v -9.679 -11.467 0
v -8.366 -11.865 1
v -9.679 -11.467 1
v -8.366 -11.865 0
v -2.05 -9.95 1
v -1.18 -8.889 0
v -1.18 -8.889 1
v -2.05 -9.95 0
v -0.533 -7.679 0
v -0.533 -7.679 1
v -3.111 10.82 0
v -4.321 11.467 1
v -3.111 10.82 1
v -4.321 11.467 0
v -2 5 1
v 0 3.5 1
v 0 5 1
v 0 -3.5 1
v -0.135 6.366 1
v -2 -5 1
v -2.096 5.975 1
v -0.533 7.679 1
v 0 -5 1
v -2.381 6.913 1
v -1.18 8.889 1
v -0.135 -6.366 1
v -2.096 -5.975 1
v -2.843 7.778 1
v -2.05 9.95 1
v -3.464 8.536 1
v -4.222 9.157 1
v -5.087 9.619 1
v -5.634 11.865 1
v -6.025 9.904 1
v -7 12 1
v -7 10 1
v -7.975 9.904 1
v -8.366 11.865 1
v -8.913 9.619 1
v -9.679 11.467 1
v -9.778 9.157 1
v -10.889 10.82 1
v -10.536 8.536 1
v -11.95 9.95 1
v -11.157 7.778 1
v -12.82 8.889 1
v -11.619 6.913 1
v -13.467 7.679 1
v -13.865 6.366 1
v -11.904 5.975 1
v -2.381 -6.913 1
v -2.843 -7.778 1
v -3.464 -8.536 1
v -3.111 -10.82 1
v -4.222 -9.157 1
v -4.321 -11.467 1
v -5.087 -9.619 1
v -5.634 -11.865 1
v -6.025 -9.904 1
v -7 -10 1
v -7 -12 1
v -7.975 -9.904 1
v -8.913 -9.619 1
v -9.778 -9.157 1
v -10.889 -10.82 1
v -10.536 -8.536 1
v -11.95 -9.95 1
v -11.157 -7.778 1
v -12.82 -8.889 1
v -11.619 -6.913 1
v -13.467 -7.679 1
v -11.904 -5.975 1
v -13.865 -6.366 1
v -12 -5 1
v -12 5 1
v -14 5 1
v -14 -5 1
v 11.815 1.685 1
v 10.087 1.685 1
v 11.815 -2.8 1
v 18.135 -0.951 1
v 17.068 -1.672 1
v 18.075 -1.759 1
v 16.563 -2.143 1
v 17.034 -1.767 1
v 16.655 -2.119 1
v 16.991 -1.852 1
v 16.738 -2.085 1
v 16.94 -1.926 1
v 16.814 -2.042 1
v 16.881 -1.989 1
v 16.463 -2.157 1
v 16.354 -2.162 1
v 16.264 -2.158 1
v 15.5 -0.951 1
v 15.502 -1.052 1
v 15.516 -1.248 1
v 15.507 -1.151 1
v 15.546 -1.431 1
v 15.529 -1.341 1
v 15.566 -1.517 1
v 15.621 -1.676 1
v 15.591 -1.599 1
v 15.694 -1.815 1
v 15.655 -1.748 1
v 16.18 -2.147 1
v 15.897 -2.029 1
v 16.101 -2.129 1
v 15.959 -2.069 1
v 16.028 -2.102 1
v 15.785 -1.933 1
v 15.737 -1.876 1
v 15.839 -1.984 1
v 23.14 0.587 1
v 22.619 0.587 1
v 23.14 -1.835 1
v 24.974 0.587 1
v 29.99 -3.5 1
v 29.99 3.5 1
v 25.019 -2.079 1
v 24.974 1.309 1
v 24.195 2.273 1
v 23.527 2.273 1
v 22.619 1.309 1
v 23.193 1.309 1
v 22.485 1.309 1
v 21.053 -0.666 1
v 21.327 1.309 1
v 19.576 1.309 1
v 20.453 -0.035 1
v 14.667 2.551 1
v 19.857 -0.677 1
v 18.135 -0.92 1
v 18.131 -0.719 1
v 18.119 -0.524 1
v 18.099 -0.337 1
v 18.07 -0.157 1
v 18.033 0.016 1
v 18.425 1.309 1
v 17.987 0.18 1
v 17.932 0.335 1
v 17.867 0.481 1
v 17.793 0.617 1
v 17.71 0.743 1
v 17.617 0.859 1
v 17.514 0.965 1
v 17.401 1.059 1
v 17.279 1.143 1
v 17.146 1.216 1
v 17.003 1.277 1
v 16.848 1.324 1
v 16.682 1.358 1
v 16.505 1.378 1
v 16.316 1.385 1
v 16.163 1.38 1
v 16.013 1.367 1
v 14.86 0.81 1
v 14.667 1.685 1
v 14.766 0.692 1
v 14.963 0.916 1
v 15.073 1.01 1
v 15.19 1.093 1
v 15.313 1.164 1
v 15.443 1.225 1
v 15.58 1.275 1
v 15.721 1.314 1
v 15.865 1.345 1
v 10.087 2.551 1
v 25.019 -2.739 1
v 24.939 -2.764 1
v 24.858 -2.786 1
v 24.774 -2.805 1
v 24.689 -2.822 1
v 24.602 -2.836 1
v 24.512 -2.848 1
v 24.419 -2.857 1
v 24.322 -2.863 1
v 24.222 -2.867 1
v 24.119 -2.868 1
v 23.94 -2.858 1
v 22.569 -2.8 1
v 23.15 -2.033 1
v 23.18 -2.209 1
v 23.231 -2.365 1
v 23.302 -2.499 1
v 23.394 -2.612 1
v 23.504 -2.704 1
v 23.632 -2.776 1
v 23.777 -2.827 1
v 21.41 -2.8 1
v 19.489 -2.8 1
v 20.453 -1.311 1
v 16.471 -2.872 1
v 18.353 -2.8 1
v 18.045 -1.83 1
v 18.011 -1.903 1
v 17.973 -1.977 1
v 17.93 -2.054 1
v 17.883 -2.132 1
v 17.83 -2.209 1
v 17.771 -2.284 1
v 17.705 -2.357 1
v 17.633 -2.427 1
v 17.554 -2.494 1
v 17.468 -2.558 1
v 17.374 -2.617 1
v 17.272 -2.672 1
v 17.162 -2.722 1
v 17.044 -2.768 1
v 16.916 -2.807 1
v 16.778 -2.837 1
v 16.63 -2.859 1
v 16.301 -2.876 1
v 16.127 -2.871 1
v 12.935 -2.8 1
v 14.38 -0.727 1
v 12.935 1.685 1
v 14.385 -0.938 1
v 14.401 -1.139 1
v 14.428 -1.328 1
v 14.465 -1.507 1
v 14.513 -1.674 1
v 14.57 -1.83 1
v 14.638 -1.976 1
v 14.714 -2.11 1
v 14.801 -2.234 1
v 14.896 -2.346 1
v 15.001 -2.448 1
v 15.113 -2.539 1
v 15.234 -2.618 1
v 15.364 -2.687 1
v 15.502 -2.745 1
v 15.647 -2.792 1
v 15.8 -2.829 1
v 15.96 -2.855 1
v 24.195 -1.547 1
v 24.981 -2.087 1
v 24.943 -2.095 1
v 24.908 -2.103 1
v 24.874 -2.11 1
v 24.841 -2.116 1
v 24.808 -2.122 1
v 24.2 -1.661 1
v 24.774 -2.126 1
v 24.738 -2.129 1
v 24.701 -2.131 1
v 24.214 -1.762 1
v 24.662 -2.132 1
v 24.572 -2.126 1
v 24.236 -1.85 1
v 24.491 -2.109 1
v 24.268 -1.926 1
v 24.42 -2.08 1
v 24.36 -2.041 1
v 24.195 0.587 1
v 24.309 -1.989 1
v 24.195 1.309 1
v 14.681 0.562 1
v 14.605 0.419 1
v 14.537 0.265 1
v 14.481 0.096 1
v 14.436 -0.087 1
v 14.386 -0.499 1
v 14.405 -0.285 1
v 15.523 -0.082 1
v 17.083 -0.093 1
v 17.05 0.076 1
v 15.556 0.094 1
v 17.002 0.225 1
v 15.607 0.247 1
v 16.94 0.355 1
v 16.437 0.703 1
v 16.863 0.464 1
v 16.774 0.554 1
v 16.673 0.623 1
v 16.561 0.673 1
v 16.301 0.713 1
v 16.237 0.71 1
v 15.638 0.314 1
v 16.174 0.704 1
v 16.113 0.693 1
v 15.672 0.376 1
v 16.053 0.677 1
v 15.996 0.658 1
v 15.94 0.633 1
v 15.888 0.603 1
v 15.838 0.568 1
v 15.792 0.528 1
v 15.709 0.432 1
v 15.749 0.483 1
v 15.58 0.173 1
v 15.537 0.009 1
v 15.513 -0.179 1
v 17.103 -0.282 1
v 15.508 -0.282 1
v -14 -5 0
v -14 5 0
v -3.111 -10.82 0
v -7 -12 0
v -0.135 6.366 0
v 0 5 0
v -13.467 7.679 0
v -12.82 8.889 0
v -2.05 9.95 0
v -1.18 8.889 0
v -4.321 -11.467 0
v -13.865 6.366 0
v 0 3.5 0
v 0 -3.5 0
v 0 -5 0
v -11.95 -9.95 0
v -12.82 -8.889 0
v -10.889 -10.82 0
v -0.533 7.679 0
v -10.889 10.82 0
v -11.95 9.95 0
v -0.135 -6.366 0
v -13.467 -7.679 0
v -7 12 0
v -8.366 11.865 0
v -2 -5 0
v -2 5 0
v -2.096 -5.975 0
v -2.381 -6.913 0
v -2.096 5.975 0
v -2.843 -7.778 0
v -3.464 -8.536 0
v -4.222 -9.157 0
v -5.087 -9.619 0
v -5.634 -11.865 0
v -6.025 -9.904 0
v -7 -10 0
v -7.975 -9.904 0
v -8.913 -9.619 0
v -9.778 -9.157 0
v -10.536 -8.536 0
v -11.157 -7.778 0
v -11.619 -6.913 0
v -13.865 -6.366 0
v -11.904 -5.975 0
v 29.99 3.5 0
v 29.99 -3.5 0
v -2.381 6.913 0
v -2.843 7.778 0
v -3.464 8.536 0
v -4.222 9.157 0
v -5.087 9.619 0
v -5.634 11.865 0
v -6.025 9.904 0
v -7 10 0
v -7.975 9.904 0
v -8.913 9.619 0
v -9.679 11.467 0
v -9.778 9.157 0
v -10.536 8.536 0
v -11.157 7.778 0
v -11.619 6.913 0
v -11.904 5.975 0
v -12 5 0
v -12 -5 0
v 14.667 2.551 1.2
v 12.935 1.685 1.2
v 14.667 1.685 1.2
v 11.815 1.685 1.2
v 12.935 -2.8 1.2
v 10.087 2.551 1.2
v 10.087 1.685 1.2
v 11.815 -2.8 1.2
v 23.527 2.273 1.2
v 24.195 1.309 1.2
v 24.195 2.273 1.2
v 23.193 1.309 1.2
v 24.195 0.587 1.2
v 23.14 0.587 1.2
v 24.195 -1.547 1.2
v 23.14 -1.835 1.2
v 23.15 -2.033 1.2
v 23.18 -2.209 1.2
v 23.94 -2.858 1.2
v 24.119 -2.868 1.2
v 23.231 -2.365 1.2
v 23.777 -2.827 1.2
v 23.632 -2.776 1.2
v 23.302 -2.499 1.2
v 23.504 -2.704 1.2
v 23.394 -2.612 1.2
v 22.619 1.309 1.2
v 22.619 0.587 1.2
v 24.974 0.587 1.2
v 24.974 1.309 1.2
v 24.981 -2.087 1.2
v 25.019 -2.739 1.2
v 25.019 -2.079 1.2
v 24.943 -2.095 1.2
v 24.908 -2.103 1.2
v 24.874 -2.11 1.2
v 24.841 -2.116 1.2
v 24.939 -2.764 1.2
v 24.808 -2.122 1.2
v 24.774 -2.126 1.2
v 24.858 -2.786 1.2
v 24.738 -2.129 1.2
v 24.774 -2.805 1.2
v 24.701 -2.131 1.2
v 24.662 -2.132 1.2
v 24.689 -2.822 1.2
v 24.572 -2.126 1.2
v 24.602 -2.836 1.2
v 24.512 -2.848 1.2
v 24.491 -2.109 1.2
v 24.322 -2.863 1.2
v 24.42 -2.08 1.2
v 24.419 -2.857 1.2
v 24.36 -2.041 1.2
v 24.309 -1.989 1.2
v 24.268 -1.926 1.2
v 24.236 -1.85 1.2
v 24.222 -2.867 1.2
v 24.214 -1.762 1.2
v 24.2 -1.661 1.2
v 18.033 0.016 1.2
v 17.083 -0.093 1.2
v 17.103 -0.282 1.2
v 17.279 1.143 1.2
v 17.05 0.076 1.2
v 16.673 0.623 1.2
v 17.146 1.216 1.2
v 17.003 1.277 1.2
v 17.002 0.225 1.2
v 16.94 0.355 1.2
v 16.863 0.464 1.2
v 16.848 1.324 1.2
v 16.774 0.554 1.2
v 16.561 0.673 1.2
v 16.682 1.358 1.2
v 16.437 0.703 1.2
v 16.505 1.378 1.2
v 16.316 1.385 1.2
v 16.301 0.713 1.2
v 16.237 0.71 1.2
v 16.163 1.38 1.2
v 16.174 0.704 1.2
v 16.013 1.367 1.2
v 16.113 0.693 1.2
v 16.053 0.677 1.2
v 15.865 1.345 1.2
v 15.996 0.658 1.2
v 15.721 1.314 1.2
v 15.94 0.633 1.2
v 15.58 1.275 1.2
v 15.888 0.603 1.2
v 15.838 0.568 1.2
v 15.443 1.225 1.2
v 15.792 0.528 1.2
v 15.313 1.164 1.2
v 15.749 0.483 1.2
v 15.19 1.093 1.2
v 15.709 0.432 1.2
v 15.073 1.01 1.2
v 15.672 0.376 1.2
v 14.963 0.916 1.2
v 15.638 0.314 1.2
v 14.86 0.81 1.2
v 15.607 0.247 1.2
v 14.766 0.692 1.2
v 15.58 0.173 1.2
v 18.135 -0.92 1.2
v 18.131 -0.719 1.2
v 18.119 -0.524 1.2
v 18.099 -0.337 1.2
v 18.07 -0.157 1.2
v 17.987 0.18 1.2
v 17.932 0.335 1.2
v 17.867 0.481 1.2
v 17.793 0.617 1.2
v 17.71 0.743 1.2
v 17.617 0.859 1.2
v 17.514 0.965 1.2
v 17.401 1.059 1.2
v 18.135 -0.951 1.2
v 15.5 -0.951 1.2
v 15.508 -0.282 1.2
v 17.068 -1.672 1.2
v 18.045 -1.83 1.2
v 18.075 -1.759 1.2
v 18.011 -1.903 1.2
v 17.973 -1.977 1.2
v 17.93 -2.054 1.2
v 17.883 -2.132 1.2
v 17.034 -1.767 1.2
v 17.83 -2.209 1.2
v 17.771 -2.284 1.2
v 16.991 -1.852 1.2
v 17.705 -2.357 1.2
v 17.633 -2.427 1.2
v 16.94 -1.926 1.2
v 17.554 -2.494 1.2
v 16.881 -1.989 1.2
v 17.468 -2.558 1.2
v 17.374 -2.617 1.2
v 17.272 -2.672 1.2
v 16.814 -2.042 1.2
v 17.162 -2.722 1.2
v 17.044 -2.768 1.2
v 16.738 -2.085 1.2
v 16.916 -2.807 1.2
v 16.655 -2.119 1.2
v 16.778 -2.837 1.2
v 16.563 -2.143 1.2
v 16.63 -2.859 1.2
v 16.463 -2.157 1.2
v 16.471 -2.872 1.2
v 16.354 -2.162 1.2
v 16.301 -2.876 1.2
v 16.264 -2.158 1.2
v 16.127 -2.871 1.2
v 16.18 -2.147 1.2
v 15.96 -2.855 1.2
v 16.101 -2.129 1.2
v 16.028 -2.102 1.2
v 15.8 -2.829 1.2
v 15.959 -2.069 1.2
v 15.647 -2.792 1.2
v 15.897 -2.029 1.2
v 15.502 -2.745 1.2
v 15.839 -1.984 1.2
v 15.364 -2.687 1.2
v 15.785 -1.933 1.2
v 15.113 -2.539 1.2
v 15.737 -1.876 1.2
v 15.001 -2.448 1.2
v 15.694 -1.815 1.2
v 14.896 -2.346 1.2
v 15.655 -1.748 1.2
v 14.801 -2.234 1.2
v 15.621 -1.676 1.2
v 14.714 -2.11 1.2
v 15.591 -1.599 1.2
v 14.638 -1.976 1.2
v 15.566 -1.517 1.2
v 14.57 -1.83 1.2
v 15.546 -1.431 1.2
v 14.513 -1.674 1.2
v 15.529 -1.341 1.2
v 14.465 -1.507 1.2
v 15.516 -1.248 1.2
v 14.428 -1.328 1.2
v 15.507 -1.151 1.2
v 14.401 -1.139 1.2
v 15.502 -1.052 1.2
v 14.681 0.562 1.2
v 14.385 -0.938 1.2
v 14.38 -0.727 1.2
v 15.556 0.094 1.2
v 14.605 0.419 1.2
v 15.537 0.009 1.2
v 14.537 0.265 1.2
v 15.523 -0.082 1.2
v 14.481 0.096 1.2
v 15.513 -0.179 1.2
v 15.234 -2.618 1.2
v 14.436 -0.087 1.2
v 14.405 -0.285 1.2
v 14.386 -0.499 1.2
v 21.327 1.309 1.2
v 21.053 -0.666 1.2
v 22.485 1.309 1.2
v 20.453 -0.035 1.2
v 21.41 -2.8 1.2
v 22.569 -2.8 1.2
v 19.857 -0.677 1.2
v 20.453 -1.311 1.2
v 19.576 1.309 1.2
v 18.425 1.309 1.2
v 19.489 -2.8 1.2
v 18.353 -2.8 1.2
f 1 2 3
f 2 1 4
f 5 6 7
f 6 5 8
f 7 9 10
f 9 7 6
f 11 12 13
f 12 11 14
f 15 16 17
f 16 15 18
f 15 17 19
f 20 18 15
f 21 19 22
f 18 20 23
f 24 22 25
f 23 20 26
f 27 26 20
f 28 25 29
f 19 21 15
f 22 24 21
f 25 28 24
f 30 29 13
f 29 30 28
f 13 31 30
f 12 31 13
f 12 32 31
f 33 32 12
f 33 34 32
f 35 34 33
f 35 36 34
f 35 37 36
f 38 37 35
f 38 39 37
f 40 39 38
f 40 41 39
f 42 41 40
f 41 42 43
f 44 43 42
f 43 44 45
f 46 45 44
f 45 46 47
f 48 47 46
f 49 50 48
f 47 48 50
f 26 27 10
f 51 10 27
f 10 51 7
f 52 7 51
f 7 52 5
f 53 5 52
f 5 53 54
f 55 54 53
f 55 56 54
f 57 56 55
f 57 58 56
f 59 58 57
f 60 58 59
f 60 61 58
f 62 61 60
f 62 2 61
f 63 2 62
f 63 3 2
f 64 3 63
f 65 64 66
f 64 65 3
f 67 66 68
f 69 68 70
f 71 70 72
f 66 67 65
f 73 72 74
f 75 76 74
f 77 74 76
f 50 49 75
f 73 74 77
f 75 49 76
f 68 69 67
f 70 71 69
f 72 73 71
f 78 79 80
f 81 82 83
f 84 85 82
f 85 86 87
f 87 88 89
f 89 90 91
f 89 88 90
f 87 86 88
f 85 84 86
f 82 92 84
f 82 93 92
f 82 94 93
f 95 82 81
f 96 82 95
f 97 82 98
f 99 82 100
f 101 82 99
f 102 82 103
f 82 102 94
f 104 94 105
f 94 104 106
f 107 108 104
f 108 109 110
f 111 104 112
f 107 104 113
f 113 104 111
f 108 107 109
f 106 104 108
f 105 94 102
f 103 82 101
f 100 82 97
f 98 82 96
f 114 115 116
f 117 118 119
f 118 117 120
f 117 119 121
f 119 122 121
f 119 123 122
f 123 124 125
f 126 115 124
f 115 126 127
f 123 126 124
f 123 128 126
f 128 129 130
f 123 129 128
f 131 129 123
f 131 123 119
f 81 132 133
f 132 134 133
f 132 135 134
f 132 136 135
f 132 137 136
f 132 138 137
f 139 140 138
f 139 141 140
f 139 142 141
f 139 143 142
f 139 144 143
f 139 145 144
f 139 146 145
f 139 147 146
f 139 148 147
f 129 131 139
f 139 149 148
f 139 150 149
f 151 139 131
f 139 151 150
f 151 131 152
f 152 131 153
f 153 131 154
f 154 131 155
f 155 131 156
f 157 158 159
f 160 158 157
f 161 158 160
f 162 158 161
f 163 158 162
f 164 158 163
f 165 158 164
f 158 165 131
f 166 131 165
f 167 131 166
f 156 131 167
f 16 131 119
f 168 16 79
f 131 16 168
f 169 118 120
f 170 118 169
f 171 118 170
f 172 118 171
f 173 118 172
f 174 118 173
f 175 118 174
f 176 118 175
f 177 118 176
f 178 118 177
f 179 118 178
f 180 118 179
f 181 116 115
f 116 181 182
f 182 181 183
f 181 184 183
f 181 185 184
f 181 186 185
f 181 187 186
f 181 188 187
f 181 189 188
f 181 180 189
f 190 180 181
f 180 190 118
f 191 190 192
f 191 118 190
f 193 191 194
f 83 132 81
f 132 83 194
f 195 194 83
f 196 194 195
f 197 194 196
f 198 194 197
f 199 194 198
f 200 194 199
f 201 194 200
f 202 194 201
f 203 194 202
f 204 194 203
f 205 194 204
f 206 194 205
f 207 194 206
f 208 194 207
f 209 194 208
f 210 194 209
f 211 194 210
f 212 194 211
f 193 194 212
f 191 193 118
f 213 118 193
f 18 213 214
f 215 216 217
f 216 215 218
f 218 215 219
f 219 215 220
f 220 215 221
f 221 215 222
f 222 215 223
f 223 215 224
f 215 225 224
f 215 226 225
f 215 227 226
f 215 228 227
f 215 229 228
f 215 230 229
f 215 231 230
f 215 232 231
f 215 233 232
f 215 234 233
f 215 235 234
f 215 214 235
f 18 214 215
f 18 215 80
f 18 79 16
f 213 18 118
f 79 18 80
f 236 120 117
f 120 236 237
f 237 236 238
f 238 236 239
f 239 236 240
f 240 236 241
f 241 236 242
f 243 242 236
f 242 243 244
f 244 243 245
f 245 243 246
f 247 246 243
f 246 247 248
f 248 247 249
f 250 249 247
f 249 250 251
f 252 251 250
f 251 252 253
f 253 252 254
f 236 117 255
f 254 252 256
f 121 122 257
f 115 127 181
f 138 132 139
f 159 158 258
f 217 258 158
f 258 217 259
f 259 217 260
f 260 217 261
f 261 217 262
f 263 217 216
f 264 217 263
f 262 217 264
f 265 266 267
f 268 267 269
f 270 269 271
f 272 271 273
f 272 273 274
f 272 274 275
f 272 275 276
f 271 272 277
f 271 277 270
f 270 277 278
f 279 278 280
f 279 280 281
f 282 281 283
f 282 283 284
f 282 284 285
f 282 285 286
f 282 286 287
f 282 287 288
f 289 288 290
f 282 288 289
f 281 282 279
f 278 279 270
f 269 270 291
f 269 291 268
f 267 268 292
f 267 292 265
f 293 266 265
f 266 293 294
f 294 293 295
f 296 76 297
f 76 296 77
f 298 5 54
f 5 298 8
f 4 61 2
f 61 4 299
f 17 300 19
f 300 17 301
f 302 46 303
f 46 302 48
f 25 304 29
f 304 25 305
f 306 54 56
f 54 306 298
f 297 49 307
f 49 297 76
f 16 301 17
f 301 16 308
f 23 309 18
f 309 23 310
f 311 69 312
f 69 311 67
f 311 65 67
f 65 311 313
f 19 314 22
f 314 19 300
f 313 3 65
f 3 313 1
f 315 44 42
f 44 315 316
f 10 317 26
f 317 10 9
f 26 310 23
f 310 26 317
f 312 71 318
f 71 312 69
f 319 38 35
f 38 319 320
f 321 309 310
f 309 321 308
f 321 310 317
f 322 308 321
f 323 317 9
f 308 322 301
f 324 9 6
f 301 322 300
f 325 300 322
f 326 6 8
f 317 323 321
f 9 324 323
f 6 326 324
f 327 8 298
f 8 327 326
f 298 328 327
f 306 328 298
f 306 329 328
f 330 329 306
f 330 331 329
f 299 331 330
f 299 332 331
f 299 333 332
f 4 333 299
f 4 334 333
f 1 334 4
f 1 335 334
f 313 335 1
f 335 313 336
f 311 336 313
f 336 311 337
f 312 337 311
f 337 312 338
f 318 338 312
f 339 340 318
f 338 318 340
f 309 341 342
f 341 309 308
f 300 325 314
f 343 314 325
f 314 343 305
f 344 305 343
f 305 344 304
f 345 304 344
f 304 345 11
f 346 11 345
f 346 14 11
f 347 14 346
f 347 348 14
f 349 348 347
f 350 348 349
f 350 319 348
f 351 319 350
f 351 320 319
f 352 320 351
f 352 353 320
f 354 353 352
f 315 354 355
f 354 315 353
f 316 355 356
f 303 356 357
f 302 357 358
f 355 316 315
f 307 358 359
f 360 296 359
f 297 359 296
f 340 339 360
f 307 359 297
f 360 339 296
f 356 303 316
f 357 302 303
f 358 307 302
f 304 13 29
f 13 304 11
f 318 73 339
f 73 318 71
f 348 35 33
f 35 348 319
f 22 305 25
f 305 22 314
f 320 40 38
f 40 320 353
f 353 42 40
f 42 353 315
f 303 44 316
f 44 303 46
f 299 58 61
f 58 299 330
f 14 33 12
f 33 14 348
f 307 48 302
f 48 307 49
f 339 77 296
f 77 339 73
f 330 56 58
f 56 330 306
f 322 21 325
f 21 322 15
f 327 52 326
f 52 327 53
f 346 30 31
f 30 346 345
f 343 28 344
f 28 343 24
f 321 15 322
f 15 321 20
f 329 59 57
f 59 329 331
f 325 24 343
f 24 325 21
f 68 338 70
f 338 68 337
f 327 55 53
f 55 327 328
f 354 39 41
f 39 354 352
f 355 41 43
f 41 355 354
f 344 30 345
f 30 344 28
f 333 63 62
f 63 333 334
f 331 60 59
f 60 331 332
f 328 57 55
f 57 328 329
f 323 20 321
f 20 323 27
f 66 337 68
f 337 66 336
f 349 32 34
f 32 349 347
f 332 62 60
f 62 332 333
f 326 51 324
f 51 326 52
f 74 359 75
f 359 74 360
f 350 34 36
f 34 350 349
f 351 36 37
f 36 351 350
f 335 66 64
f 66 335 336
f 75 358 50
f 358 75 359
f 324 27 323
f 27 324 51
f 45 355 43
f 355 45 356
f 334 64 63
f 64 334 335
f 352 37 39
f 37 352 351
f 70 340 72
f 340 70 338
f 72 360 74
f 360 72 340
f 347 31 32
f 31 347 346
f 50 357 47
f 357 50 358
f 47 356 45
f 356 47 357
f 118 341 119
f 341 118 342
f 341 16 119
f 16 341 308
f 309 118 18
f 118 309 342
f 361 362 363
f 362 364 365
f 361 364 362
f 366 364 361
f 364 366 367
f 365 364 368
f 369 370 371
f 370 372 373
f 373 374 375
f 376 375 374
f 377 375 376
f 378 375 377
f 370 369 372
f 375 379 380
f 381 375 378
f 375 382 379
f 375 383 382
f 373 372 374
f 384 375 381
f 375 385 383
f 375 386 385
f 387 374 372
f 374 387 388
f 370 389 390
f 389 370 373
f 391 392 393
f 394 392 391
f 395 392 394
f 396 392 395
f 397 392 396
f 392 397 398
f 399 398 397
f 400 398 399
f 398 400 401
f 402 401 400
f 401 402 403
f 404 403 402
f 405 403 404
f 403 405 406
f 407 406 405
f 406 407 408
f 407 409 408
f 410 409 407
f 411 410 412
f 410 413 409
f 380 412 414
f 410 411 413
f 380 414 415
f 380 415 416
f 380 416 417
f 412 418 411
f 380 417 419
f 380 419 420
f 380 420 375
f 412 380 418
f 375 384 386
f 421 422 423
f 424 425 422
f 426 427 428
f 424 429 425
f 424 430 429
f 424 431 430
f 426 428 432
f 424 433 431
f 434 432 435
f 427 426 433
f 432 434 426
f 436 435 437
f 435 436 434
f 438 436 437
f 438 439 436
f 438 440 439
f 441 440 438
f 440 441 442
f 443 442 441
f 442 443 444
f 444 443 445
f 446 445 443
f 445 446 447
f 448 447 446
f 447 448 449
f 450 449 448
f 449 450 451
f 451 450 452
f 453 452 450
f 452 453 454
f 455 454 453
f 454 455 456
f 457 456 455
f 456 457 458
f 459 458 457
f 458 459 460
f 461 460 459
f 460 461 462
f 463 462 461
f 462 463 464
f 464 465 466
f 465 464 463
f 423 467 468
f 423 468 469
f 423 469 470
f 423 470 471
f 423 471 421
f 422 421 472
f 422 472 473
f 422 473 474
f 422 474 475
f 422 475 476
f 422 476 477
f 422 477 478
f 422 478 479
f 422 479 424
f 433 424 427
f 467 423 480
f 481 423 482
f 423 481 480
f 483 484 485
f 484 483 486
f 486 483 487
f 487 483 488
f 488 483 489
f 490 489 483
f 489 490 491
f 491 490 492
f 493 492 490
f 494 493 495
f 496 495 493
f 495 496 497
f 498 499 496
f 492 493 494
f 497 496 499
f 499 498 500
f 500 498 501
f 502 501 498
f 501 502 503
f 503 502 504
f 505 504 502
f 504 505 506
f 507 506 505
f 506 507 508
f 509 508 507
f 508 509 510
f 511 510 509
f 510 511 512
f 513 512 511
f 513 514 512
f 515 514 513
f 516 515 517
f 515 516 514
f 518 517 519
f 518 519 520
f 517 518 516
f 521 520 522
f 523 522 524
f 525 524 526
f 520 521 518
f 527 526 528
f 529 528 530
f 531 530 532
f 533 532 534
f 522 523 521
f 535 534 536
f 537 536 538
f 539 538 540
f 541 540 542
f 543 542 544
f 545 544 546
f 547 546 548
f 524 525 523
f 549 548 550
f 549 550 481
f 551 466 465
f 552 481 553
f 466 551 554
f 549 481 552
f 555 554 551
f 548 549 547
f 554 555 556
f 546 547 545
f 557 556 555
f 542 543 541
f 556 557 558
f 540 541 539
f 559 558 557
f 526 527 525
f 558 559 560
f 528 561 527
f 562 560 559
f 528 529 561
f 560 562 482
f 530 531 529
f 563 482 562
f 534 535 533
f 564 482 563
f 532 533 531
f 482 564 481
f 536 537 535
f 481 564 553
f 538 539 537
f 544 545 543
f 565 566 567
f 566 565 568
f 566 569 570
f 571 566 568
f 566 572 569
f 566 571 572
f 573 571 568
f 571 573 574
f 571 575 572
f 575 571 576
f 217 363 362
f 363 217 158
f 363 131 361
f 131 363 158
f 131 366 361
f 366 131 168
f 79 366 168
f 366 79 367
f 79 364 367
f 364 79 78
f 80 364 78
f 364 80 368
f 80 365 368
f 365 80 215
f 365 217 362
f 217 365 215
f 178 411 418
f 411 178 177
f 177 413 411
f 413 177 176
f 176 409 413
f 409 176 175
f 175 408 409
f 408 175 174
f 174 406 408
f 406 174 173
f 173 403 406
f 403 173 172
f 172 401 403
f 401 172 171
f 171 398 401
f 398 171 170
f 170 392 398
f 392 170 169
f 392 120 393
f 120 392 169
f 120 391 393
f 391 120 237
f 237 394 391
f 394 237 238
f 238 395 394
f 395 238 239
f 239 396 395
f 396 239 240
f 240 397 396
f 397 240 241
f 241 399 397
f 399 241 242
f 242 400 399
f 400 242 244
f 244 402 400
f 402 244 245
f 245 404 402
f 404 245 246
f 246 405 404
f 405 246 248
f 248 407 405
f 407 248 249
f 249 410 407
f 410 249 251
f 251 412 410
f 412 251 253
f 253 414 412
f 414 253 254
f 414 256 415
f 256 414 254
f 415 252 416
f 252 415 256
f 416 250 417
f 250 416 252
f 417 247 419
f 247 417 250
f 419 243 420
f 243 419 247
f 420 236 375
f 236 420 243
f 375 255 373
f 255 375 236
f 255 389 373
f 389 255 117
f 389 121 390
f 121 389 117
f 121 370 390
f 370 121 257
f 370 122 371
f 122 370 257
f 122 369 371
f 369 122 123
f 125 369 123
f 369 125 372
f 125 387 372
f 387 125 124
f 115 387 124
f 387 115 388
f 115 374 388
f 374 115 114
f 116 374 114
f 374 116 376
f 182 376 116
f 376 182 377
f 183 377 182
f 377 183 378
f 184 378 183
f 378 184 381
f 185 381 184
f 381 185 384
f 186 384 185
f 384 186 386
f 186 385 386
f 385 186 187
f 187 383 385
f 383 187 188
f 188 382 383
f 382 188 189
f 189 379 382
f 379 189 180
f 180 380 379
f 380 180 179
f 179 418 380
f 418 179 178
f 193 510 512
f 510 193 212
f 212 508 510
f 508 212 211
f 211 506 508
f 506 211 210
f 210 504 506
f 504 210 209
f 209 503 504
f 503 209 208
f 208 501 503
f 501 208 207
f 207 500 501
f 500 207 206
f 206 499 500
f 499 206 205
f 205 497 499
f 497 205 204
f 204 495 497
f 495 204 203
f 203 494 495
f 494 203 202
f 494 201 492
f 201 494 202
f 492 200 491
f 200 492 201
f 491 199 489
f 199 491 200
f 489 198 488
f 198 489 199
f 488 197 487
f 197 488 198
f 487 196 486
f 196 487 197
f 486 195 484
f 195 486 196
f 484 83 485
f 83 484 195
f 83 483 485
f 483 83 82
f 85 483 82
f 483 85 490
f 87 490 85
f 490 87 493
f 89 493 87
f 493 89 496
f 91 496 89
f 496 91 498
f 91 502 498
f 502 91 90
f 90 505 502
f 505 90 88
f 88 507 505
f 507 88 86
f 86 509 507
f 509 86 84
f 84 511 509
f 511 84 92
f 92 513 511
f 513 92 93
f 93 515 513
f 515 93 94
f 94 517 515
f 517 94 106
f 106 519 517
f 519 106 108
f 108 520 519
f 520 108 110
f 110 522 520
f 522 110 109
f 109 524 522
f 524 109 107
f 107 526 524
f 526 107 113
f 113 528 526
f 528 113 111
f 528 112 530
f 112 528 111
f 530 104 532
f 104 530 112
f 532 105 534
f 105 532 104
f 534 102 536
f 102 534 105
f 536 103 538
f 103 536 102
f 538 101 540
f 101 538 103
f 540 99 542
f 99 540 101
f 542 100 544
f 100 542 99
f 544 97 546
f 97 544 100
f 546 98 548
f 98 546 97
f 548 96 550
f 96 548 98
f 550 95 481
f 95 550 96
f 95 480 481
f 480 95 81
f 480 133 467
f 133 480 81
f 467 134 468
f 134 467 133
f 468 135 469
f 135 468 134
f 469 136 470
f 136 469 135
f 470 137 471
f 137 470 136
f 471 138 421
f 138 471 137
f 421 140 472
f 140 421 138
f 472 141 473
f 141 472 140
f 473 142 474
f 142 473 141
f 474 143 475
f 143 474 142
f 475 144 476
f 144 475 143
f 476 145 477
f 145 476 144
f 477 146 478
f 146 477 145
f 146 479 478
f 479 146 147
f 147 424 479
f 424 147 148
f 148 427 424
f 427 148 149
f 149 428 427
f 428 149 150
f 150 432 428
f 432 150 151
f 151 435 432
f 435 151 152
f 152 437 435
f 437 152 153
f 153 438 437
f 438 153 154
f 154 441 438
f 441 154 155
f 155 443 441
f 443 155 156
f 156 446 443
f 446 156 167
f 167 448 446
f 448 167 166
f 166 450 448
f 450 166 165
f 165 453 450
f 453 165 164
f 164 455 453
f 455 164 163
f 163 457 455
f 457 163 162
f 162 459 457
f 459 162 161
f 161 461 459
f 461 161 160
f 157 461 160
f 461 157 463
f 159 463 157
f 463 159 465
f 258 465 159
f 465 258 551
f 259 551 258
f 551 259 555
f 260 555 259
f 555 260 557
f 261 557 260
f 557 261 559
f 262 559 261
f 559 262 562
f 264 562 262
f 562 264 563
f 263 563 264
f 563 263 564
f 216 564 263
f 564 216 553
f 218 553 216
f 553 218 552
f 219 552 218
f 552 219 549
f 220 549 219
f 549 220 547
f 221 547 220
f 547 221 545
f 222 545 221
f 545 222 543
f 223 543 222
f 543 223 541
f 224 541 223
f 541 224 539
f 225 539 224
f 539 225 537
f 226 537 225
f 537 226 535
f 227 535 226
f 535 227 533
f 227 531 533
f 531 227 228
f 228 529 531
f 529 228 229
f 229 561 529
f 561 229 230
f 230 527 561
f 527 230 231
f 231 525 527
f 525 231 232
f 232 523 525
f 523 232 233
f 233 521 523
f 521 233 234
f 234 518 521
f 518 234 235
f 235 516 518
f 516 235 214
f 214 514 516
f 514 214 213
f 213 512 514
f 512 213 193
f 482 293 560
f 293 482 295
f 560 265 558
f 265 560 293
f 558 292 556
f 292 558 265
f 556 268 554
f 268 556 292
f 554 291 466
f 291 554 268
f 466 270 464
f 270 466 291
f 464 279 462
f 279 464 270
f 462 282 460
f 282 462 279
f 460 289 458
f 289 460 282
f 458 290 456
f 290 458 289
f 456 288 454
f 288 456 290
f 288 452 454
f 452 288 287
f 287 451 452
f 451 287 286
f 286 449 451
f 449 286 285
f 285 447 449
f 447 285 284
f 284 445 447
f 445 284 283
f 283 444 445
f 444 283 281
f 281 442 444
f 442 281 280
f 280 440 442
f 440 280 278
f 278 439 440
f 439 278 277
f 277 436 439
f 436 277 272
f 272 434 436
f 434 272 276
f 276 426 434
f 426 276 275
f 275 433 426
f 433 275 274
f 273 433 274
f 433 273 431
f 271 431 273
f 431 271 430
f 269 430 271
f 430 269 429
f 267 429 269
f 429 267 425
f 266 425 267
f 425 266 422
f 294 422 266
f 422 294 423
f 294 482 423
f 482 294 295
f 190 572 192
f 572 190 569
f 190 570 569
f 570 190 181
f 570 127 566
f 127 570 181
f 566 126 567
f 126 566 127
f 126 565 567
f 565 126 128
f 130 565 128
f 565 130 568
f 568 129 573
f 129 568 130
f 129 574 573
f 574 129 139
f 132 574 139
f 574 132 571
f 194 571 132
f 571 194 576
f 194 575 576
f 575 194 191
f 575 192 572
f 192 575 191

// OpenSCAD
string = "Text";
tag_length = 20;			// [10:1:100]
part = "both"; 				// [both:Both,base:Base,text:Text]


/* [Extra] */

base_thickness = 1;			// [0.1:0.1:2]
text_thickness = 0.2;		// [0.1:0.1:2]
height = 7;					// [5:1:30]
diameter = 10;				// [5:1:30]


/* [Hidden] */

$fn = 32;
e = 0.01;

ringTh = 2 * base_thickness;



module tag(string, len)
{
    if (part == "base" || part == "both") union()
    {
        translate([-diameter/2 - ringTh, 0, 0]) difference()
        {
            hull()
            {
                for (y = [-diameter/2 , diameter/2])
                    translate([0, y, 0]) cylinder(base_thickness, d = diameter + 2*ringTh);
            }
            
            hull()
            {
                for (y = [-diameter/2 , diameter/2])
                    translate([0, y, -e]) cylinder(base_thickness + 2*e, d = diameter);
            }
        }

        translate([-e, -height/2, 0]) cube([len+diameter, height, base_thickness]);
    }

	if (part == "text" || part == "both")
	{
		color("black") translate([diameter, -height * 0.4, base_thickness]) linear_extrude(height = text_thickness) 
			text(string, font="Liberation Sans:style=Bold", size = height * 0.8);
	}
}


// One tag.

tag(string, tag_length);


// Full set of tags.

*union()
{
	for (x = [0, 50])
	{
		translate([x, 0, 0]) tag("DP1", 16);
		translate([x, 25, 0])tag("DP2", 16);
		translate([x, 50, 0])tag("HDMI1", 25);
		translate([x, 75, 0])tag("HDMI2", 25);
		translate([x, 100, 0])tag("HDMI3", 25);
		translate([x, 125, 0])tag("HDMI4", 25);
	}

	translate([100, 0, 0]) tag("PC1", 16);
	translate([100, 25, 0]) tag("PC2", 16);
	translate([100, 50, 0]) tag("PC3", 16);

	translate([0, 150, 0]) tag("Monitor 1", 35);
	translate([0, 175, 0]) tag("Monitor 2", 35);
	translate([60, 150, 0]) tag("Monitor 3", 35);
	translate([60, 175, 0]) tag("Monitor 4", 35);

	translate([100, 75, 0]) tag("Xbox S", 27);
	translate([100, 100, 0]) tag("Xbox X", 27);
	translate([100, 125, 0]) tag("Xbox S", 27);
	translate([120, 150, 0]) tag("Xbox X", 27);
}
